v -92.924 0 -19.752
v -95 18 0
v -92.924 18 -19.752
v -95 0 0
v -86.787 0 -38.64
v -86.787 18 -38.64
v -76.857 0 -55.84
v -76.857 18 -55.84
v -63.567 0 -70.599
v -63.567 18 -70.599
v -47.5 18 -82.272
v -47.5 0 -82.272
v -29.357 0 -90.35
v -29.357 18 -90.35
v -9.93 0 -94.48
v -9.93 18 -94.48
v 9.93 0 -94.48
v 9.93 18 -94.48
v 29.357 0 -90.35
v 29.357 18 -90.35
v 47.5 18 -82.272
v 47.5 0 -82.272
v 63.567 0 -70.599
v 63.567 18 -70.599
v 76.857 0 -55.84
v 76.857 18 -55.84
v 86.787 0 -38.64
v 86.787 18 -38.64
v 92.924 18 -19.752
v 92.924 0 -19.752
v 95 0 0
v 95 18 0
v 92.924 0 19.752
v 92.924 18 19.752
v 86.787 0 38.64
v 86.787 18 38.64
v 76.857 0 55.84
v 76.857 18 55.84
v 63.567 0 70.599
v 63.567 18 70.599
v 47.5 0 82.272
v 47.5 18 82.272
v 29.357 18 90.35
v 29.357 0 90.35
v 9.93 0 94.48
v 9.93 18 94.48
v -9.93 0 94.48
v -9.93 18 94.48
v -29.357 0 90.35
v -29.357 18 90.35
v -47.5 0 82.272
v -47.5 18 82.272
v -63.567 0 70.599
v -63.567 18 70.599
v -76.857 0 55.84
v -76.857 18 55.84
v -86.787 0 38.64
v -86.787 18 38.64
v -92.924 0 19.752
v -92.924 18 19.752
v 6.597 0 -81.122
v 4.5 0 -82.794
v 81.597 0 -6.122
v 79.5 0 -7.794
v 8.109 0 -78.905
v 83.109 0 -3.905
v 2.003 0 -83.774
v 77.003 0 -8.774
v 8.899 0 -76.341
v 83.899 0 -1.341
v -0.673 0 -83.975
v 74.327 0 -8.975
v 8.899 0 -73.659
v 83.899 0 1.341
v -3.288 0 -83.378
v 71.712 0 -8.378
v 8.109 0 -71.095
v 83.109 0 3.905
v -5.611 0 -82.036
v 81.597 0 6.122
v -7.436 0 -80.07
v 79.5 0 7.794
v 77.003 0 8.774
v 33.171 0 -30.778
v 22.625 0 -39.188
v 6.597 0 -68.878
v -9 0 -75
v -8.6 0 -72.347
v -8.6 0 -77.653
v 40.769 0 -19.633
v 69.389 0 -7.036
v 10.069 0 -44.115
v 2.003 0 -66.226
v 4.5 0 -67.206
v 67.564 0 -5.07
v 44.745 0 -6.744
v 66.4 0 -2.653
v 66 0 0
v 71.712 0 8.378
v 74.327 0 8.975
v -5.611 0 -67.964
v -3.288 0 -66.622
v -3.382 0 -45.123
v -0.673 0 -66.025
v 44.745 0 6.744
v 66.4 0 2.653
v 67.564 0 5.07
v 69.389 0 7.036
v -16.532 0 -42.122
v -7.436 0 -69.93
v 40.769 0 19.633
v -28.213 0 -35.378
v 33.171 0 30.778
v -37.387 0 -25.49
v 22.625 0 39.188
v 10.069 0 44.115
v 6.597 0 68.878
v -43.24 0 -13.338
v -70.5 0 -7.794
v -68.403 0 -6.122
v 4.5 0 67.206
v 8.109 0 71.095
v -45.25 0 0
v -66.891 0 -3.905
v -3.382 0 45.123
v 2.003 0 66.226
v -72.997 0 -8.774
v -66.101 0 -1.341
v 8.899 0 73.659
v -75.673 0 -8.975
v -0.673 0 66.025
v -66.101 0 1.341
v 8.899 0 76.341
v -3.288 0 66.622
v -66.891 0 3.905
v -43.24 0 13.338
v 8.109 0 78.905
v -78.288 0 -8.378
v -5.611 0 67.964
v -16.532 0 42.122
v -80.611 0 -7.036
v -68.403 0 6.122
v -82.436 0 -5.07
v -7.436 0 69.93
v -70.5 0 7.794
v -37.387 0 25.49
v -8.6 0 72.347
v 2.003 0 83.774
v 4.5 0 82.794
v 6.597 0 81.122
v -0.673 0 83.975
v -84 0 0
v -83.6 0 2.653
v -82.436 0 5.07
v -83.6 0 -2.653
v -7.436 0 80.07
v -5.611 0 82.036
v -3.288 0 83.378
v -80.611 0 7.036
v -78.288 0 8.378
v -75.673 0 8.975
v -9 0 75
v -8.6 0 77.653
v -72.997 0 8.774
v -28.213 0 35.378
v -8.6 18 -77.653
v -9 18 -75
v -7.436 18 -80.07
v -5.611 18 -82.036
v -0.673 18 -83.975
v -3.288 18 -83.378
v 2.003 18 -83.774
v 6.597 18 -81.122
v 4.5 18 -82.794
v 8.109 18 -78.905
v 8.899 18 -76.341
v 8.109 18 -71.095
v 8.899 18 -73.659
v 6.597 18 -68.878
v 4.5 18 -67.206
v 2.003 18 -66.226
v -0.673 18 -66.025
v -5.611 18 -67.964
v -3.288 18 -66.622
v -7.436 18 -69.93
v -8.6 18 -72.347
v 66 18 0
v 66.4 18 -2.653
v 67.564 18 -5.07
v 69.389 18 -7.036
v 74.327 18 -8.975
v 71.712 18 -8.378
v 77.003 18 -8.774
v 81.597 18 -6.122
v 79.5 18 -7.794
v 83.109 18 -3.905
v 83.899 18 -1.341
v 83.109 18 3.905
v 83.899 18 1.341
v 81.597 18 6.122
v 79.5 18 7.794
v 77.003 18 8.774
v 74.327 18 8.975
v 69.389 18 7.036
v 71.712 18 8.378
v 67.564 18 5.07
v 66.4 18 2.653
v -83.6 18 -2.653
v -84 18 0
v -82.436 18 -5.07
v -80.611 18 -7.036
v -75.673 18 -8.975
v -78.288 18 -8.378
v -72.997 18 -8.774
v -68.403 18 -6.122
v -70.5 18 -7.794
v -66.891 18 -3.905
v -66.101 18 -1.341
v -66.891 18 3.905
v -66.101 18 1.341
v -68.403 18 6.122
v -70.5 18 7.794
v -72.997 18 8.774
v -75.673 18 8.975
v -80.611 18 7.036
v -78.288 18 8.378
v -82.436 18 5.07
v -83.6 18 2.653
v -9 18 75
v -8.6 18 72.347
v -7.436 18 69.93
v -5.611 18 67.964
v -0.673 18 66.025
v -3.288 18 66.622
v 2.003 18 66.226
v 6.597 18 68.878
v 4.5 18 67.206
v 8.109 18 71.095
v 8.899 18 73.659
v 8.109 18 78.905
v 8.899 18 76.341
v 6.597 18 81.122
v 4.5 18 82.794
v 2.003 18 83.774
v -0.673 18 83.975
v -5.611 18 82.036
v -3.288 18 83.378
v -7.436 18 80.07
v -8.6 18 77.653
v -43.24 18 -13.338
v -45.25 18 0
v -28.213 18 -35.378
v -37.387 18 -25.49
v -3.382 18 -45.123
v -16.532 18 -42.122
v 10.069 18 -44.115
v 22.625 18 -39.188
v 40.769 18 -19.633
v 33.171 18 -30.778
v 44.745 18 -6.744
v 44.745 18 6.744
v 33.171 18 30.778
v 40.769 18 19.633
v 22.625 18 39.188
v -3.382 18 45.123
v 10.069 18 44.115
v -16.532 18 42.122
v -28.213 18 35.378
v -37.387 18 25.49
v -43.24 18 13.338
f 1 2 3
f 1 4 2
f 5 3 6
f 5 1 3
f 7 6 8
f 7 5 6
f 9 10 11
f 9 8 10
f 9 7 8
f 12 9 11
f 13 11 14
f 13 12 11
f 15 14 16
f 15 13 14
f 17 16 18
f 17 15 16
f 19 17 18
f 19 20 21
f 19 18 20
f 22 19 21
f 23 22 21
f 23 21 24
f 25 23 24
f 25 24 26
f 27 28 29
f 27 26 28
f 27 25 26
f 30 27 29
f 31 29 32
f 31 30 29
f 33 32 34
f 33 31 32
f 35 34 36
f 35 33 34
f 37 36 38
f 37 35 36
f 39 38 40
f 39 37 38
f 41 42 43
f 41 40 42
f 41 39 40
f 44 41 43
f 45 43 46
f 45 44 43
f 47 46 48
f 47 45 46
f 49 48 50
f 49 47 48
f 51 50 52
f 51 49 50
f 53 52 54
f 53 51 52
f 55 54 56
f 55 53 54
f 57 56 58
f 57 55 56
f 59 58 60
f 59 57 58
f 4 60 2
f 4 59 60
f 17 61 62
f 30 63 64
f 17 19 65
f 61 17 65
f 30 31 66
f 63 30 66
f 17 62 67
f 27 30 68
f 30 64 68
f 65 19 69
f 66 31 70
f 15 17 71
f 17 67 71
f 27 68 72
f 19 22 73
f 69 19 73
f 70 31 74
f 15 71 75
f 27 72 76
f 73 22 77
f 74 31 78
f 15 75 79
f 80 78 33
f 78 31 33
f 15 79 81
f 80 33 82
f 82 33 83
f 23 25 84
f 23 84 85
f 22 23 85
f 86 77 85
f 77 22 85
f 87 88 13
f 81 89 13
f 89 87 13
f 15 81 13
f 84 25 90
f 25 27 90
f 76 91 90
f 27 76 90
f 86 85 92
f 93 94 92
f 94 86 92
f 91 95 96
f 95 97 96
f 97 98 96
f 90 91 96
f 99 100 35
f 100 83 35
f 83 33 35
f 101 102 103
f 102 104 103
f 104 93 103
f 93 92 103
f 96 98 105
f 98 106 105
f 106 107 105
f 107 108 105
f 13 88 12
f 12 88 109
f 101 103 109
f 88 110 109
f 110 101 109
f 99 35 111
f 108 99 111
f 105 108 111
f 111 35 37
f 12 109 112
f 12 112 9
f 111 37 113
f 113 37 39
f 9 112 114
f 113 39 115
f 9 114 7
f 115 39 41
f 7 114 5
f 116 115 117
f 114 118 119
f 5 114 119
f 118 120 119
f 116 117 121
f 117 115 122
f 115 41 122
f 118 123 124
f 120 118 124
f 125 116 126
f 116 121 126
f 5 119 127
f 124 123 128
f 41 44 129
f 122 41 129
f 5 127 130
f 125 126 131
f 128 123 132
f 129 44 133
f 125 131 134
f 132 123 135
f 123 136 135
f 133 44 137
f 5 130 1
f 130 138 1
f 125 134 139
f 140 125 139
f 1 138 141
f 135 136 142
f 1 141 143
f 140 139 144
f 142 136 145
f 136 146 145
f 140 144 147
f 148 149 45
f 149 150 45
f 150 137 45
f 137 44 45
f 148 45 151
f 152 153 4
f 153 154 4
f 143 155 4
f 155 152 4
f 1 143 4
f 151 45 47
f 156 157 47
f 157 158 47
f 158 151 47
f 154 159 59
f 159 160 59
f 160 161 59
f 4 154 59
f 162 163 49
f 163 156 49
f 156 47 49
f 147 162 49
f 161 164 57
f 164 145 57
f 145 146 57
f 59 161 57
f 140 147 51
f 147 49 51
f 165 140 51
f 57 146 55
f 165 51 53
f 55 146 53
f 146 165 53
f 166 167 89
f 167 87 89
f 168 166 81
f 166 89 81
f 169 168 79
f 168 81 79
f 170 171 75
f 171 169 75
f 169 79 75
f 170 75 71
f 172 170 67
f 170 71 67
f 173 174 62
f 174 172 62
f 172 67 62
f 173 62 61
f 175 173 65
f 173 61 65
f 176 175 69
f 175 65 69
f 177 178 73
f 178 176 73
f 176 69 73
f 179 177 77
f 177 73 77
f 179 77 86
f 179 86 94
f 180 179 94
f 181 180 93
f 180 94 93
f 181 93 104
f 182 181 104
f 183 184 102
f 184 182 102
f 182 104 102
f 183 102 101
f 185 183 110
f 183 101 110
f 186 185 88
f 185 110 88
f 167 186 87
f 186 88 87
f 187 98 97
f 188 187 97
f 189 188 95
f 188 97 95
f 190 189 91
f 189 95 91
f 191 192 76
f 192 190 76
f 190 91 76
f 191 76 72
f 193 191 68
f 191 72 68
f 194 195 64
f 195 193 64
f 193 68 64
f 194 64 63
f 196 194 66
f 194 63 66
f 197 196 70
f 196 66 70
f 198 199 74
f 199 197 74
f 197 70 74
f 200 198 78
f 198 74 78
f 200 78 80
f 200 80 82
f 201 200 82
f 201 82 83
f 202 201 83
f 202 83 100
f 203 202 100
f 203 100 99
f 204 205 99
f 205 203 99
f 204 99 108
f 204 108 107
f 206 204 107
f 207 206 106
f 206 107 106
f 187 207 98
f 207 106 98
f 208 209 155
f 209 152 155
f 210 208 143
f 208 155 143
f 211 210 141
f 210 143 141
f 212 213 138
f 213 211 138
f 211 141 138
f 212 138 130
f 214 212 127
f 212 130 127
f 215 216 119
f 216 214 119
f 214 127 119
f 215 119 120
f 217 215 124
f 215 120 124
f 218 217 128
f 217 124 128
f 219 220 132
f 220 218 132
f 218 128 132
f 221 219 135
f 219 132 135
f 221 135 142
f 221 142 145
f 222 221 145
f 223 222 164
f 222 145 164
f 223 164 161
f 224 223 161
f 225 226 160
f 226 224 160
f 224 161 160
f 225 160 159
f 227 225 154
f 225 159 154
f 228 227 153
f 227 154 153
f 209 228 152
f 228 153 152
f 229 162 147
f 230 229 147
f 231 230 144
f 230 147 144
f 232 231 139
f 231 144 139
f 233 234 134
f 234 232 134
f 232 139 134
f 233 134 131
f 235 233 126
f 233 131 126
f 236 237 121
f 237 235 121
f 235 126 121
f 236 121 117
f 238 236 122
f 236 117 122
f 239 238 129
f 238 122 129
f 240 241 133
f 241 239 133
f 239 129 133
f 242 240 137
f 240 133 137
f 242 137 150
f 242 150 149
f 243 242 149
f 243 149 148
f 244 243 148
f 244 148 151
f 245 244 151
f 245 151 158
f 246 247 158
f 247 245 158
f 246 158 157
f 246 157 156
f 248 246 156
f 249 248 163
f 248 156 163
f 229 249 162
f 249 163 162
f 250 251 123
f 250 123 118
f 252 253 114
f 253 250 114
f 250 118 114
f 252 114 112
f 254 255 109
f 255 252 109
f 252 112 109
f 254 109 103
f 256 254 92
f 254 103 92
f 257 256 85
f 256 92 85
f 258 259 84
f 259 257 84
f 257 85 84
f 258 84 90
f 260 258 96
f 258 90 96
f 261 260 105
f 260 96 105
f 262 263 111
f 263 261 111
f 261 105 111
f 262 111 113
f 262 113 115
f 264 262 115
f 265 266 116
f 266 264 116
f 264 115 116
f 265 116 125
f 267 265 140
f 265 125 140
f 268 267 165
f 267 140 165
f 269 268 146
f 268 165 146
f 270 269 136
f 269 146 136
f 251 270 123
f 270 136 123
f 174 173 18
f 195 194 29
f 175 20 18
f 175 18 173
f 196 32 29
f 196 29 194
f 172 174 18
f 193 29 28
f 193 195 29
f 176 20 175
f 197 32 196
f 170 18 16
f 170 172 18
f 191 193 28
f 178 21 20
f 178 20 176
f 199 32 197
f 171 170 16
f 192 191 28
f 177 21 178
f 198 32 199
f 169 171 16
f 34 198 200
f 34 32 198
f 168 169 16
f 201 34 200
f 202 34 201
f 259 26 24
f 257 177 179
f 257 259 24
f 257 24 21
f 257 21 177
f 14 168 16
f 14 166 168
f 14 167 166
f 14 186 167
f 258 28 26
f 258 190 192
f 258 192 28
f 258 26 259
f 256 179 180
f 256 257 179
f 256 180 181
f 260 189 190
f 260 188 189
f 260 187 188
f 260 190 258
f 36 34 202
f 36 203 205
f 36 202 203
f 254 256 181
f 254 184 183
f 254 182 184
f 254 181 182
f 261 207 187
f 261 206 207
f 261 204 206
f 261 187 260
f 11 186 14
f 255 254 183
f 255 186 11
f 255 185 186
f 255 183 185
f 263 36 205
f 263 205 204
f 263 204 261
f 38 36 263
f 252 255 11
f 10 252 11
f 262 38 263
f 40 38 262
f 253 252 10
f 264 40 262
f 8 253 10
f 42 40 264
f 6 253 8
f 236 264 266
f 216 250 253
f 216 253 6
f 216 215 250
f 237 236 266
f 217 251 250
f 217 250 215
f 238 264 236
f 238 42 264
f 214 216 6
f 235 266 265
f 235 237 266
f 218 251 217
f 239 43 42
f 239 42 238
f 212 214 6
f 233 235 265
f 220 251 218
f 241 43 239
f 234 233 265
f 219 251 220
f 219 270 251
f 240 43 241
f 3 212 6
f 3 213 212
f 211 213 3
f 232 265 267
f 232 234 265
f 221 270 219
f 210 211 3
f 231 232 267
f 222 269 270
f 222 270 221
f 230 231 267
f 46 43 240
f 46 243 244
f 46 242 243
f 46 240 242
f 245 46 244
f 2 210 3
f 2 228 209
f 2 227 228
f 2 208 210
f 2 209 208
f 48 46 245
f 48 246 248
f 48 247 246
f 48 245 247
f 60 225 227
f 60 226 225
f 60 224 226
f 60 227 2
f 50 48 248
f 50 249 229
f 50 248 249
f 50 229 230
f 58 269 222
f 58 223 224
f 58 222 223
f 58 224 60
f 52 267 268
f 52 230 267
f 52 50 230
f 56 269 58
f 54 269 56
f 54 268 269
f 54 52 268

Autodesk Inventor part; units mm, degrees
ref_plane "YZ Plane" through (0, 0, 0) normal (1, 0, 0) x (0, 1, 0)
ref_plane "XZ Plane" through (0, 0, 0) normal (0, 1, 0) x (-1, 0, 0)
ref_plane "XY Plane" through (0, 0, 0) normal (0, 0, 1) x (1, 0, 0)
sketch "Schizzo1" plane through (0, 0, 0) normal (0, 1, 0) x (-1, 0, 0)
  circle A0 centre (0, 0) radius 95
  circle A1 centre (0, 0) radius 45.25
  circle A2 centre (0, 0) radius 75 construction
  circle A3 centre (0, 75) radius 9
  circle A4 centre (-75, 0) radius 9
  circle A5 centre (0, -75) radius 9
  circle A6 centre (75, 0) radius 9
  dimension "d2" = 150
  dimension "d0" = 190
  dimension "d1" = 90.5
  dimension "d3" = 18
  dimension "d6" = 360
extrude "Estrusione1" add sketch "Schizzo1" along normal blind 18
properties part number "06-01-2023 flangia DN80"
